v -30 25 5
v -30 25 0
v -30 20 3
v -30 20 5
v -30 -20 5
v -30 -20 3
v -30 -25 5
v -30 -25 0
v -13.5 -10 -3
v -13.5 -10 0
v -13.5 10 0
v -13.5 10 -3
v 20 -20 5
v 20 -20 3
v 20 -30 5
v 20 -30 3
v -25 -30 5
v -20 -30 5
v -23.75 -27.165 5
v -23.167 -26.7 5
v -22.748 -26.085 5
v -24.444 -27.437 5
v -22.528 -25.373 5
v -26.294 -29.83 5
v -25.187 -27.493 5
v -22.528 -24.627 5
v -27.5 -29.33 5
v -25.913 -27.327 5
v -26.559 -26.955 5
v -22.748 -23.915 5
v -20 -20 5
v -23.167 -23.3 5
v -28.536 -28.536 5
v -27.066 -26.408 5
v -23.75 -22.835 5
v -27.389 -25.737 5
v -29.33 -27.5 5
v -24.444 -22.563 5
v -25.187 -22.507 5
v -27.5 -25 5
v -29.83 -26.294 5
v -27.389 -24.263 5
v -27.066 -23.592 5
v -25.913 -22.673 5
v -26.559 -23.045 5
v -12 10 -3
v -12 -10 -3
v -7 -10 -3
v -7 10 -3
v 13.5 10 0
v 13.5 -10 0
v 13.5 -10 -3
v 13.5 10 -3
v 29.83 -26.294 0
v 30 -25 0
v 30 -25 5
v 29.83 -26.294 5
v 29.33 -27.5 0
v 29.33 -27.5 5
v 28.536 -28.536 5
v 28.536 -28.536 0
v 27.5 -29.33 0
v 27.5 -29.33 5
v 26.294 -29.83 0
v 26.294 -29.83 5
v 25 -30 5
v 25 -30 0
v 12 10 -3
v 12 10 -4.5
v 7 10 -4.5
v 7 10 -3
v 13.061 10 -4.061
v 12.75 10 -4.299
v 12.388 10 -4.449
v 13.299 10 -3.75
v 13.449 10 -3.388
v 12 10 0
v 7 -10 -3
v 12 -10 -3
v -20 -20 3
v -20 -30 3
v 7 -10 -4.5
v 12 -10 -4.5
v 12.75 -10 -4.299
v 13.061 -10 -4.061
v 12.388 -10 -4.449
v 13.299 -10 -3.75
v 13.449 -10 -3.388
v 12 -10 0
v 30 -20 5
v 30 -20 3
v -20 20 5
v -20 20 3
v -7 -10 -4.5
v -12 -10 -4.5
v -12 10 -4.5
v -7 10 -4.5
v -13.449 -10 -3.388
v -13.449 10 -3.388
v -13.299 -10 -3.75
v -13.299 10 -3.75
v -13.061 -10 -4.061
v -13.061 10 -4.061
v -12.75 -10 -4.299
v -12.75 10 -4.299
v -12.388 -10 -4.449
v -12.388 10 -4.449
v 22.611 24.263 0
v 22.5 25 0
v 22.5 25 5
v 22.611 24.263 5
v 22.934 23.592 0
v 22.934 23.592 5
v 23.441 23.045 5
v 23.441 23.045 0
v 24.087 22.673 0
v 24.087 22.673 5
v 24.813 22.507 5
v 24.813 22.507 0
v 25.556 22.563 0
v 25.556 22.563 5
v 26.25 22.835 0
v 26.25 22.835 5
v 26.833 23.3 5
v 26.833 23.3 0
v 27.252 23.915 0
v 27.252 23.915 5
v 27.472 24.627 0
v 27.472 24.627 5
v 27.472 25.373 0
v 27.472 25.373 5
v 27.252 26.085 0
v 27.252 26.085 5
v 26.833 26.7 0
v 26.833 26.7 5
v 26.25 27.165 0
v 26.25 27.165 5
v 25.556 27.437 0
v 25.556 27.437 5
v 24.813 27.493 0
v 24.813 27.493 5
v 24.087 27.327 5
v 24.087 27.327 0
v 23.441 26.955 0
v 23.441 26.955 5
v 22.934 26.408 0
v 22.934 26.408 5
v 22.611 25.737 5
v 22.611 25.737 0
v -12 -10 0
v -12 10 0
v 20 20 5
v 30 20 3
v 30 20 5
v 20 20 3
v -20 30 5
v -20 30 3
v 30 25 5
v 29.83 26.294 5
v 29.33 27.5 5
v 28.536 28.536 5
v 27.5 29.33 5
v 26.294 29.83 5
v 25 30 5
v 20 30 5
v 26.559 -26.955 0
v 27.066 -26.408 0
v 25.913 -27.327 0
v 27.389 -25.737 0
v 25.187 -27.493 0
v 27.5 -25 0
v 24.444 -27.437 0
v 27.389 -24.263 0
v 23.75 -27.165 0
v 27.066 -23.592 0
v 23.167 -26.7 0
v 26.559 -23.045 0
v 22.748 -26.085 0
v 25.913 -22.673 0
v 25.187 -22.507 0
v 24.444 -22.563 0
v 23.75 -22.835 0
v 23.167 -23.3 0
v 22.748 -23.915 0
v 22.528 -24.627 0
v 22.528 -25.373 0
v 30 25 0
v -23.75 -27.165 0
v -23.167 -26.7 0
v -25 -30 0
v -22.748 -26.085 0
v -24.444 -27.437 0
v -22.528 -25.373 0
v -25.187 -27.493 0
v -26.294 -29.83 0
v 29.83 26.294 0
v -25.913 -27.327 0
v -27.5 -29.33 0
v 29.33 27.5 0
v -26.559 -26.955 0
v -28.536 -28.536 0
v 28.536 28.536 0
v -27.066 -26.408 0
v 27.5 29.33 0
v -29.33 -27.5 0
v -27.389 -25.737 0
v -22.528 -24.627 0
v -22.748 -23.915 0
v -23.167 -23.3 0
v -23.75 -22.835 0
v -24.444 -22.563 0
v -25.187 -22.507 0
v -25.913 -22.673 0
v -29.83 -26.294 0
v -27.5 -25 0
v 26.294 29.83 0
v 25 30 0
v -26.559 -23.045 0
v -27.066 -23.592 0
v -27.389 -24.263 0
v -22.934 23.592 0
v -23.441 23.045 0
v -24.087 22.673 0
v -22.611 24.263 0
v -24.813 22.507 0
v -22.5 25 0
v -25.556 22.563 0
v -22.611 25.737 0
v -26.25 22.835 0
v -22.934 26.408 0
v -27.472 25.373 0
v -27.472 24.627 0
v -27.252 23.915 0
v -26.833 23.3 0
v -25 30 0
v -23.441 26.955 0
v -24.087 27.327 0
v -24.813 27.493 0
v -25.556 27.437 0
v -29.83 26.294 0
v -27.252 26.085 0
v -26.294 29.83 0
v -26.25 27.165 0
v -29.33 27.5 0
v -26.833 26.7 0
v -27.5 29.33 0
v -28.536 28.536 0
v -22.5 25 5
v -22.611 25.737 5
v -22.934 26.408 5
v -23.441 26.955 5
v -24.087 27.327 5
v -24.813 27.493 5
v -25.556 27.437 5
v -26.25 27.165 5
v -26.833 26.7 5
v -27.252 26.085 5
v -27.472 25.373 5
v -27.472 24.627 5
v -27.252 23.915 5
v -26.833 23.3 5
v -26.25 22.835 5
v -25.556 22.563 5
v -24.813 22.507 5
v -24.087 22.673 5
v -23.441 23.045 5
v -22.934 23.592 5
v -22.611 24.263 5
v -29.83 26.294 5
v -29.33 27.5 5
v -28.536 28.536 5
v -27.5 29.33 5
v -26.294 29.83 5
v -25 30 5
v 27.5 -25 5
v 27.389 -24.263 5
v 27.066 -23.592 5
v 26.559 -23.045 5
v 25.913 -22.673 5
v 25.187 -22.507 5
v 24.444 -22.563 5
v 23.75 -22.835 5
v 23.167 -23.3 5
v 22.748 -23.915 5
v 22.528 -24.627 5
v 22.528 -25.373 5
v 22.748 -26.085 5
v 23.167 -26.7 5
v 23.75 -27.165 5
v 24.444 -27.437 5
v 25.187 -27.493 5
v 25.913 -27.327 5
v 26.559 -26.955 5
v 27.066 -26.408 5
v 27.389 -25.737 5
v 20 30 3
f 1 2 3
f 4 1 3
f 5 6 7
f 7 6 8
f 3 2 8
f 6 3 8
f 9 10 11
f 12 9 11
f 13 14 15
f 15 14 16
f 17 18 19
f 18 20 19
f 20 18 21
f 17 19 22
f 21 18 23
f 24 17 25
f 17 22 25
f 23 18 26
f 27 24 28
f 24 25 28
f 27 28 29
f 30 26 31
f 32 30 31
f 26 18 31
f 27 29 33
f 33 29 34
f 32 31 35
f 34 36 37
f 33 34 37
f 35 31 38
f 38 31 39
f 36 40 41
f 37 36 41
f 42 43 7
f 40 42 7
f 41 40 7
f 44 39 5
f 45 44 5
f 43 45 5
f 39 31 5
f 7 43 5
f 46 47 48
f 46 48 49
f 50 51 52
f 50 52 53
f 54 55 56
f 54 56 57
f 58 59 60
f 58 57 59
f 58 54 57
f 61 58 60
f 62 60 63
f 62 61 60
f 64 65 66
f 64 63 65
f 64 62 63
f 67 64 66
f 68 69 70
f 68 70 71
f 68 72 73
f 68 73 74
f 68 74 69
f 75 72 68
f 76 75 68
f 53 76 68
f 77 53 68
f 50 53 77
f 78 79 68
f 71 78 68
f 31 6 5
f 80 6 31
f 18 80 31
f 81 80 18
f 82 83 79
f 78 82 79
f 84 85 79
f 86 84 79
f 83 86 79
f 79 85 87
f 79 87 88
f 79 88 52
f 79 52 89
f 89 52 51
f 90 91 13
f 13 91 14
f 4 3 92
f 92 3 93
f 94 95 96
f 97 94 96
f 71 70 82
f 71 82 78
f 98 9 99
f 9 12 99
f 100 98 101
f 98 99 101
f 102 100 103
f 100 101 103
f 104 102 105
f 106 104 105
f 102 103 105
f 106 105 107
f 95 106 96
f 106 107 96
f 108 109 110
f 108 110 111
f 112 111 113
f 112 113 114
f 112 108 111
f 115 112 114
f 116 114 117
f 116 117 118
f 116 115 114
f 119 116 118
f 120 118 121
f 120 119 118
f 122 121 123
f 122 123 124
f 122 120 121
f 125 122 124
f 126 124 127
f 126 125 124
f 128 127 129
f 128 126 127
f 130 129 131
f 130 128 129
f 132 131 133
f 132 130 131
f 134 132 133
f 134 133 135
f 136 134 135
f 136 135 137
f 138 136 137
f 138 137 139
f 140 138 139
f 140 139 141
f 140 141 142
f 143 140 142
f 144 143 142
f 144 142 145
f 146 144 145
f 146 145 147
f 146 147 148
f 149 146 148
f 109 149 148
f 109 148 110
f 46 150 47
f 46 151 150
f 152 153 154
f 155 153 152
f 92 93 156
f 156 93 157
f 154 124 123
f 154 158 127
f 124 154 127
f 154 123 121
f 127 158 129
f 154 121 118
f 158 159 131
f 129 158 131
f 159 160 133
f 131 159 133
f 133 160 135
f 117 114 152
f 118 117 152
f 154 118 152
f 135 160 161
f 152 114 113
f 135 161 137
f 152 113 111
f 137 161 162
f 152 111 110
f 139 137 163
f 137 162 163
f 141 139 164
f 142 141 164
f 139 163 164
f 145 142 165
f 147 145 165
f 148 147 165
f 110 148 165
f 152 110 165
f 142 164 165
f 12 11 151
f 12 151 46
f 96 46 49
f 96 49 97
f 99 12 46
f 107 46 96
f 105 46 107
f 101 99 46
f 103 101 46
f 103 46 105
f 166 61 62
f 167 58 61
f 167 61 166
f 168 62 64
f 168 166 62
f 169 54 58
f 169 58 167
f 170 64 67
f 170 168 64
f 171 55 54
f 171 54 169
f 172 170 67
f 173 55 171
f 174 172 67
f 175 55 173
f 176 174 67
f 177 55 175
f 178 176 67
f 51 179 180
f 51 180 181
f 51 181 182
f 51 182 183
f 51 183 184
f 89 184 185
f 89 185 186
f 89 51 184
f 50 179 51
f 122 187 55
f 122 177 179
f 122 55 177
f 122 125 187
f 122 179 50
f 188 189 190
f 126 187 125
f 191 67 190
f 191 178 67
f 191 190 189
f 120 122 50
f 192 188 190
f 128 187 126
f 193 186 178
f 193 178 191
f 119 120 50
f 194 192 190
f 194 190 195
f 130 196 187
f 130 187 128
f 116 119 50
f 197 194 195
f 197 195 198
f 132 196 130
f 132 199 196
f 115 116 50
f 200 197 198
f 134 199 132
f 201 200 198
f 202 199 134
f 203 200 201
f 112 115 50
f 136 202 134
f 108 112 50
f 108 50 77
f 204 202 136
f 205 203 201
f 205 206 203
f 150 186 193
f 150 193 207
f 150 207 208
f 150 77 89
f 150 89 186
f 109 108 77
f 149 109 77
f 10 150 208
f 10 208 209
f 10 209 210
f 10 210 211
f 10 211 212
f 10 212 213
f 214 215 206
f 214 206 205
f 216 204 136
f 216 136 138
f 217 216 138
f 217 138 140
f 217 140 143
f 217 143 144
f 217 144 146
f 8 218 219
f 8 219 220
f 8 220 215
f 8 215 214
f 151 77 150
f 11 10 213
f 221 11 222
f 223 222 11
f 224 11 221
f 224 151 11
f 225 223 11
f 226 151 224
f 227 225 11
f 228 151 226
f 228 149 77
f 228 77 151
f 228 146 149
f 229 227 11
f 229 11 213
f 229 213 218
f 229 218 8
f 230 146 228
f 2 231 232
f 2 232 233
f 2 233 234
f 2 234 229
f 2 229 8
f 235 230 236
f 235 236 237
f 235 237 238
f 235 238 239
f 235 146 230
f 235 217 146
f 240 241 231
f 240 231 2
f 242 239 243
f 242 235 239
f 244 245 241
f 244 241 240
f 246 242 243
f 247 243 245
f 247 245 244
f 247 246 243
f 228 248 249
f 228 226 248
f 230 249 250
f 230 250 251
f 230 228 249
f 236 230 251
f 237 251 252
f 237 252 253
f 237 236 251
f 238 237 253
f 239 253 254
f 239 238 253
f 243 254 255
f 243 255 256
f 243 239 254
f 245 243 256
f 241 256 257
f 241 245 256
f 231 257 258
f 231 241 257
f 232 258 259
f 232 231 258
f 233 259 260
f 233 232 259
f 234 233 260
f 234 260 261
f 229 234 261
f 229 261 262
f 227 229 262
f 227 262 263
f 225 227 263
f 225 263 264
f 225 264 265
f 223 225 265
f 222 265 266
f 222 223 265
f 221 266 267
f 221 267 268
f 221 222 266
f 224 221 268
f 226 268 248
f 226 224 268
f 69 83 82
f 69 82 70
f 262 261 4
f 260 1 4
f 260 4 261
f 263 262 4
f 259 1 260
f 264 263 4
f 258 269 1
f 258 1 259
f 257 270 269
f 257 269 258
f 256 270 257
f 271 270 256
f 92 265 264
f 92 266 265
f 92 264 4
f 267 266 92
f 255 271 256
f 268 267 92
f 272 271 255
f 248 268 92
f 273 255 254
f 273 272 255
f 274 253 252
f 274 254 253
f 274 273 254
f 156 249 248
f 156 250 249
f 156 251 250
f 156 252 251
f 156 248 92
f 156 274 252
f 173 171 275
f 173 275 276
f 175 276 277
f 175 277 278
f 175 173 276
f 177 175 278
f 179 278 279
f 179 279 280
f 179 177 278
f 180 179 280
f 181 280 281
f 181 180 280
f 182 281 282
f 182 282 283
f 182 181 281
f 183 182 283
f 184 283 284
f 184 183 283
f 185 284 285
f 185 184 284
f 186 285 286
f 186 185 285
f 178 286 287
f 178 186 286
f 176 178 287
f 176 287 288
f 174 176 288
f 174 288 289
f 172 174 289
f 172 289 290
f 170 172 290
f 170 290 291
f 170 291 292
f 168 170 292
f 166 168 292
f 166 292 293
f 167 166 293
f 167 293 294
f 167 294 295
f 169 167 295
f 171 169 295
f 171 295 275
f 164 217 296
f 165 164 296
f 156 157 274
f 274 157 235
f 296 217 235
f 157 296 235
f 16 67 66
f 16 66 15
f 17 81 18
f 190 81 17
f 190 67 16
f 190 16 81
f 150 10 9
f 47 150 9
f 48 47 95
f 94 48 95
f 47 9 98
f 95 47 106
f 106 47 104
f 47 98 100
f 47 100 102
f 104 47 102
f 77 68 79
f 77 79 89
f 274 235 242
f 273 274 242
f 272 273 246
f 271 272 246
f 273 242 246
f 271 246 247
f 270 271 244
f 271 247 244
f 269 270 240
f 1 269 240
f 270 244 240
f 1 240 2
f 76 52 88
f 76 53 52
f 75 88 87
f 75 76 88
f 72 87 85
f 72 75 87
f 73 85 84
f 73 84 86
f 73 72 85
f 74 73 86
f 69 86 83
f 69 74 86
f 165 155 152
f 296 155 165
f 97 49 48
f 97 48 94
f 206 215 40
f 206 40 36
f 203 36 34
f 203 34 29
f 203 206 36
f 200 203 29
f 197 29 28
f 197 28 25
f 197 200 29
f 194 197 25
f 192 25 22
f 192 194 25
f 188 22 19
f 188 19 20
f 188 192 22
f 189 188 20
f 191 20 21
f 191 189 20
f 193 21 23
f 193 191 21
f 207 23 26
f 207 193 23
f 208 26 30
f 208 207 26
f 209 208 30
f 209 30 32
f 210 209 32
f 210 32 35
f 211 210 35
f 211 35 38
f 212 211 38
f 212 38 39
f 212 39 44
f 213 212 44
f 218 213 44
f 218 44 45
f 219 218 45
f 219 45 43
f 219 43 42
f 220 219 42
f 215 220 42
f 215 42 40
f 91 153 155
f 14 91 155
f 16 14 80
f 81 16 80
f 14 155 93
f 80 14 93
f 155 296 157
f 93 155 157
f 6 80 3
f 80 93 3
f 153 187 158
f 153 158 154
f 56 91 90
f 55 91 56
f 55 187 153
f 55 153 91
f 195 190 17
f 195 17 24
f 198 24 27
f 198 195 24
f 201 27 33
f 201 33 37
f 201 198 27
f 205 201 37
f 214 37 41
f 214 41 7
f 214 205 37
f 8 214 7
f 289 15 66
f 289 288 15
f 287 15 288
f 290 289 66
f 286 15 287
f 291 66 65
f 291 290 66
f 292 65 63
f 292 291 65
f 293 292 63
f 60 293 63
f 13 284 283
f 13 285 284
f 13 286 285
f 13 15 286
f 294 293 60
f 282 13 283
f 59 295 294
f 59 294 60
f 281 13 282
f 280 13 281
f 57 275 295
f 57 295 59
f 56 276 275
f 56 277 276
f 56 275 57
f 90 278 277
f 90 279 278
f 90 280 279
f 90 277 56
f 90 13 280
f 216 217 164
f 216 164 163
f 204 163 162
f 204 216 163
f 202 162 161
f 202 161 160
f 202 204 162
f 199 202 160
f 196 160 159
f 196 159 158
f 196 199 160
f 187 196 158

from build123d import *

# Parameters (mm, degrees)
SKETCH_1_R      = 2.5
EXTRUDE_1_DEPTH = 3
SKETCH_2_R      = 2.5
EXTRUDE_2_DEPTH = 2
SKETCH_3_W      = 1.5
SKETCH_3_H      = 20
EXTRUDE_4_DEPTH = 3
SKETCH_5_W      = 1.5
SKETCH_5_H      = 20
REVOLVE_2_ANGLE = 90
SKETCH_6_W      = 1.5
SKETCH_6_H      = 20
EXTRUDE_5_DEPTH = 5
SKETCH_8_W      = 1.5
SKETCH_8_H      = 20
REVOLVE_3_ANGLE = 90
SKETCH_9_W      = 1.5
SKETCH_9_H      = 20
EXTRUDE_6_DEPTH = 5


with BuildPart() as part:
    # 草图1 → 凸台-拉伸1 (new body)
    with BuildSketch(Plane.XY):
        with BuildLine():
            Line((-25, 30), (25, 30))
            ThreePointArc((25, 30), (28.535533906, 28.535533906), (30, 25))
            Line((30, 25), (30, -25))
            ThreePointArc((30, -25), (28.535533906, -28.535533906), (25, -30))
            Line((25, -30), (-25, -30))
            ThreePointArc((-25, -30), (-28.535533906, -28.535533906), (-30, -25))
            Line((-30, -25), (-30, 25))
            ThreePointArc((-30, 25), (-28.535533906, 28.535533906), (-25, 30))
        make_face()
        with Locations((-25, 25)):
            Circle(SKETCH_1_R, mode=Mode.SUBTRACT)
        with Locations(Location((25, 25, 0), (0, 0, 180))):
            Circle(SKETCH_1_R, mode=Mode.SUBTRACT)
        with Locations((25, -25)):
            Circle(SKETCH_1_R, mode=Mode.SUBTRACT)
        with Locations(Location((-25, -25, 0), (0, 0, 180))):
            Circle(SKETCH_1_R, mode=Mode.SUBTRACT)
    extrude(amount=EXTRUDE_1_DEPTH)

    # 草图2 → 凸台-拉伸2 (add)
    # profile 1 of 4: a face of its own
    with BuildSketch(Plane.XY.offset(3)):
        with BuildLine():
            Line((-30, 25), (-30, 20))
            Line((-30, 20), (-20, 20))
            Line((-20, 20), (-20, 30))
            Line((-20, 30), (-25, 30))
            ThreePointArc((-25, 30), (-28.535533906, 28.535533906), (-30, 25))
        make_face()
        with Locations((-25, 25)):
            Circle(SKETCH_2_R, mode=Mode.SUBTRACT)
    # profile 2 of 4: a face of its own
    with BuildSketch(Plane.XY.offset(3)):
        with BuildLine():
            Line((20, 30), (25, 30))
            ThreePointArc((25, 30), (28.535533906, 28.535533906), (30, 25))
            Line((30, 25), (30, 20))
            Line((30, 20), (20, 20))
            Line((20, 20), (20, 30))
        make_face()
        with Locations(Location((25, 25, 0), (0, 0, 180))):
            Circle(SKETCH_2_R, mode=Mode.SUBTRACT)
    # profile 3 of 4: a face of its own
    with BuildSketch(Plane.XY.offset(3)):
        with BuildLine():
            Line((30, -25), (30, -20))
            Line((30, -20), (20, -20))
            Line((20, -20), (20, -30))
            Line((20, -30), (25, -30))
            ThreePointArc((25, -30), (28.535533906, -28.535533906), (30, -25))
        make_face()
        with Locations((25, -25)):
            Circle(SKETCH_2_R, mode=Mode.SUBTRACT)
    # profile 4 of 4: a face of its own
    with BuildSketch(Plane.XY.offset(3)):
        with BuildLine():
            Line((-20, -30), (-25, -30))
            ThreePointArc((-25, -30), (-28.535533906, -28.535533906), (-30, -25))
            Line((-30, -25), (-30, -20))
            Line((-30, -20), (-20, -20))
            Line((-20, -20), (-20, -30))
        make_face()
        with Locations(Location((-25, -25, 0), (0, 0, 180))):
            Circle(SKETCH_2_R, mode=Mode.SUBTRACT)
    extrude(amount=EXTRUDE_2_DEPTH)

    # 草图3 → 凸台-拉伸4 (add)
    with BuildSketch(Plane(origin=(0, 0, 0), x_dir=(-1, 0, 0), z_dir=(0, 0, -1))):
        with Locations((-12.75, 0)):
            Rectangle(SKETCH_3_W, SKETCH_3_H)
        with Locations((12.75, 0)):
            Rectangle(SKETCH_3_W, SKETCH_3_H)
    extrude(amount=EXTRUDE_4_DEPTH)

    # 草图5 → 旋转2 (revolve)
    with BuildSketch(Plane(origin=(0, 0, -3), x_dir=(-1, 0, 0), z_dir=(0, 0, -1))):
        with Locations((-12.75, 0)):
            Rectangle(SKETCH_5_W, SKETCH_5_H)
    revolve(axis=Axis((12, 10, -3), (0, 1, 0)), revolution_arc=REVOLVE_2_ANGLE)

    # 草图6 → 凸台-拉伸5 (add)
    with BuildSketch(Plane.ZY.offset(-12)):
        with Locations((-3.75, 0)):
            Rectangle(SKETCH_6_W, SKETCH_6_H)
    extrude(amount=EXTRUDE_5_DEPTH)

    # 草图8 → 旋转3 (revolve)
    with BuildSketch(Plane(origin=(0, 0, -3), x_dir=(-1, 0, 0), z_dir=(0, 0, -1))):
        with Locations((12.75, 0)):
            Rectangle(SKETCH_8_W, SKETCH_8_H)
    revolve(axis=Axis((-12, 10, -3), (0, -1, 0)), revolution_arc=REVOLVE_3_ANGLE)

    # 草图9 → 凸台-拉伸6 (add)
    with BuildSketch(Plane(origin=(-12, 0, 0), x_dir=(0, 0, -1), z_dir=(1, 0, 0))):
        with Locations((3.75, 0)):
            Rectangle(SKETCH_9_W, SKETCH_9_H)
    extrude(amount=EXTRUDE_6_DEPTH)


solid = part.part
